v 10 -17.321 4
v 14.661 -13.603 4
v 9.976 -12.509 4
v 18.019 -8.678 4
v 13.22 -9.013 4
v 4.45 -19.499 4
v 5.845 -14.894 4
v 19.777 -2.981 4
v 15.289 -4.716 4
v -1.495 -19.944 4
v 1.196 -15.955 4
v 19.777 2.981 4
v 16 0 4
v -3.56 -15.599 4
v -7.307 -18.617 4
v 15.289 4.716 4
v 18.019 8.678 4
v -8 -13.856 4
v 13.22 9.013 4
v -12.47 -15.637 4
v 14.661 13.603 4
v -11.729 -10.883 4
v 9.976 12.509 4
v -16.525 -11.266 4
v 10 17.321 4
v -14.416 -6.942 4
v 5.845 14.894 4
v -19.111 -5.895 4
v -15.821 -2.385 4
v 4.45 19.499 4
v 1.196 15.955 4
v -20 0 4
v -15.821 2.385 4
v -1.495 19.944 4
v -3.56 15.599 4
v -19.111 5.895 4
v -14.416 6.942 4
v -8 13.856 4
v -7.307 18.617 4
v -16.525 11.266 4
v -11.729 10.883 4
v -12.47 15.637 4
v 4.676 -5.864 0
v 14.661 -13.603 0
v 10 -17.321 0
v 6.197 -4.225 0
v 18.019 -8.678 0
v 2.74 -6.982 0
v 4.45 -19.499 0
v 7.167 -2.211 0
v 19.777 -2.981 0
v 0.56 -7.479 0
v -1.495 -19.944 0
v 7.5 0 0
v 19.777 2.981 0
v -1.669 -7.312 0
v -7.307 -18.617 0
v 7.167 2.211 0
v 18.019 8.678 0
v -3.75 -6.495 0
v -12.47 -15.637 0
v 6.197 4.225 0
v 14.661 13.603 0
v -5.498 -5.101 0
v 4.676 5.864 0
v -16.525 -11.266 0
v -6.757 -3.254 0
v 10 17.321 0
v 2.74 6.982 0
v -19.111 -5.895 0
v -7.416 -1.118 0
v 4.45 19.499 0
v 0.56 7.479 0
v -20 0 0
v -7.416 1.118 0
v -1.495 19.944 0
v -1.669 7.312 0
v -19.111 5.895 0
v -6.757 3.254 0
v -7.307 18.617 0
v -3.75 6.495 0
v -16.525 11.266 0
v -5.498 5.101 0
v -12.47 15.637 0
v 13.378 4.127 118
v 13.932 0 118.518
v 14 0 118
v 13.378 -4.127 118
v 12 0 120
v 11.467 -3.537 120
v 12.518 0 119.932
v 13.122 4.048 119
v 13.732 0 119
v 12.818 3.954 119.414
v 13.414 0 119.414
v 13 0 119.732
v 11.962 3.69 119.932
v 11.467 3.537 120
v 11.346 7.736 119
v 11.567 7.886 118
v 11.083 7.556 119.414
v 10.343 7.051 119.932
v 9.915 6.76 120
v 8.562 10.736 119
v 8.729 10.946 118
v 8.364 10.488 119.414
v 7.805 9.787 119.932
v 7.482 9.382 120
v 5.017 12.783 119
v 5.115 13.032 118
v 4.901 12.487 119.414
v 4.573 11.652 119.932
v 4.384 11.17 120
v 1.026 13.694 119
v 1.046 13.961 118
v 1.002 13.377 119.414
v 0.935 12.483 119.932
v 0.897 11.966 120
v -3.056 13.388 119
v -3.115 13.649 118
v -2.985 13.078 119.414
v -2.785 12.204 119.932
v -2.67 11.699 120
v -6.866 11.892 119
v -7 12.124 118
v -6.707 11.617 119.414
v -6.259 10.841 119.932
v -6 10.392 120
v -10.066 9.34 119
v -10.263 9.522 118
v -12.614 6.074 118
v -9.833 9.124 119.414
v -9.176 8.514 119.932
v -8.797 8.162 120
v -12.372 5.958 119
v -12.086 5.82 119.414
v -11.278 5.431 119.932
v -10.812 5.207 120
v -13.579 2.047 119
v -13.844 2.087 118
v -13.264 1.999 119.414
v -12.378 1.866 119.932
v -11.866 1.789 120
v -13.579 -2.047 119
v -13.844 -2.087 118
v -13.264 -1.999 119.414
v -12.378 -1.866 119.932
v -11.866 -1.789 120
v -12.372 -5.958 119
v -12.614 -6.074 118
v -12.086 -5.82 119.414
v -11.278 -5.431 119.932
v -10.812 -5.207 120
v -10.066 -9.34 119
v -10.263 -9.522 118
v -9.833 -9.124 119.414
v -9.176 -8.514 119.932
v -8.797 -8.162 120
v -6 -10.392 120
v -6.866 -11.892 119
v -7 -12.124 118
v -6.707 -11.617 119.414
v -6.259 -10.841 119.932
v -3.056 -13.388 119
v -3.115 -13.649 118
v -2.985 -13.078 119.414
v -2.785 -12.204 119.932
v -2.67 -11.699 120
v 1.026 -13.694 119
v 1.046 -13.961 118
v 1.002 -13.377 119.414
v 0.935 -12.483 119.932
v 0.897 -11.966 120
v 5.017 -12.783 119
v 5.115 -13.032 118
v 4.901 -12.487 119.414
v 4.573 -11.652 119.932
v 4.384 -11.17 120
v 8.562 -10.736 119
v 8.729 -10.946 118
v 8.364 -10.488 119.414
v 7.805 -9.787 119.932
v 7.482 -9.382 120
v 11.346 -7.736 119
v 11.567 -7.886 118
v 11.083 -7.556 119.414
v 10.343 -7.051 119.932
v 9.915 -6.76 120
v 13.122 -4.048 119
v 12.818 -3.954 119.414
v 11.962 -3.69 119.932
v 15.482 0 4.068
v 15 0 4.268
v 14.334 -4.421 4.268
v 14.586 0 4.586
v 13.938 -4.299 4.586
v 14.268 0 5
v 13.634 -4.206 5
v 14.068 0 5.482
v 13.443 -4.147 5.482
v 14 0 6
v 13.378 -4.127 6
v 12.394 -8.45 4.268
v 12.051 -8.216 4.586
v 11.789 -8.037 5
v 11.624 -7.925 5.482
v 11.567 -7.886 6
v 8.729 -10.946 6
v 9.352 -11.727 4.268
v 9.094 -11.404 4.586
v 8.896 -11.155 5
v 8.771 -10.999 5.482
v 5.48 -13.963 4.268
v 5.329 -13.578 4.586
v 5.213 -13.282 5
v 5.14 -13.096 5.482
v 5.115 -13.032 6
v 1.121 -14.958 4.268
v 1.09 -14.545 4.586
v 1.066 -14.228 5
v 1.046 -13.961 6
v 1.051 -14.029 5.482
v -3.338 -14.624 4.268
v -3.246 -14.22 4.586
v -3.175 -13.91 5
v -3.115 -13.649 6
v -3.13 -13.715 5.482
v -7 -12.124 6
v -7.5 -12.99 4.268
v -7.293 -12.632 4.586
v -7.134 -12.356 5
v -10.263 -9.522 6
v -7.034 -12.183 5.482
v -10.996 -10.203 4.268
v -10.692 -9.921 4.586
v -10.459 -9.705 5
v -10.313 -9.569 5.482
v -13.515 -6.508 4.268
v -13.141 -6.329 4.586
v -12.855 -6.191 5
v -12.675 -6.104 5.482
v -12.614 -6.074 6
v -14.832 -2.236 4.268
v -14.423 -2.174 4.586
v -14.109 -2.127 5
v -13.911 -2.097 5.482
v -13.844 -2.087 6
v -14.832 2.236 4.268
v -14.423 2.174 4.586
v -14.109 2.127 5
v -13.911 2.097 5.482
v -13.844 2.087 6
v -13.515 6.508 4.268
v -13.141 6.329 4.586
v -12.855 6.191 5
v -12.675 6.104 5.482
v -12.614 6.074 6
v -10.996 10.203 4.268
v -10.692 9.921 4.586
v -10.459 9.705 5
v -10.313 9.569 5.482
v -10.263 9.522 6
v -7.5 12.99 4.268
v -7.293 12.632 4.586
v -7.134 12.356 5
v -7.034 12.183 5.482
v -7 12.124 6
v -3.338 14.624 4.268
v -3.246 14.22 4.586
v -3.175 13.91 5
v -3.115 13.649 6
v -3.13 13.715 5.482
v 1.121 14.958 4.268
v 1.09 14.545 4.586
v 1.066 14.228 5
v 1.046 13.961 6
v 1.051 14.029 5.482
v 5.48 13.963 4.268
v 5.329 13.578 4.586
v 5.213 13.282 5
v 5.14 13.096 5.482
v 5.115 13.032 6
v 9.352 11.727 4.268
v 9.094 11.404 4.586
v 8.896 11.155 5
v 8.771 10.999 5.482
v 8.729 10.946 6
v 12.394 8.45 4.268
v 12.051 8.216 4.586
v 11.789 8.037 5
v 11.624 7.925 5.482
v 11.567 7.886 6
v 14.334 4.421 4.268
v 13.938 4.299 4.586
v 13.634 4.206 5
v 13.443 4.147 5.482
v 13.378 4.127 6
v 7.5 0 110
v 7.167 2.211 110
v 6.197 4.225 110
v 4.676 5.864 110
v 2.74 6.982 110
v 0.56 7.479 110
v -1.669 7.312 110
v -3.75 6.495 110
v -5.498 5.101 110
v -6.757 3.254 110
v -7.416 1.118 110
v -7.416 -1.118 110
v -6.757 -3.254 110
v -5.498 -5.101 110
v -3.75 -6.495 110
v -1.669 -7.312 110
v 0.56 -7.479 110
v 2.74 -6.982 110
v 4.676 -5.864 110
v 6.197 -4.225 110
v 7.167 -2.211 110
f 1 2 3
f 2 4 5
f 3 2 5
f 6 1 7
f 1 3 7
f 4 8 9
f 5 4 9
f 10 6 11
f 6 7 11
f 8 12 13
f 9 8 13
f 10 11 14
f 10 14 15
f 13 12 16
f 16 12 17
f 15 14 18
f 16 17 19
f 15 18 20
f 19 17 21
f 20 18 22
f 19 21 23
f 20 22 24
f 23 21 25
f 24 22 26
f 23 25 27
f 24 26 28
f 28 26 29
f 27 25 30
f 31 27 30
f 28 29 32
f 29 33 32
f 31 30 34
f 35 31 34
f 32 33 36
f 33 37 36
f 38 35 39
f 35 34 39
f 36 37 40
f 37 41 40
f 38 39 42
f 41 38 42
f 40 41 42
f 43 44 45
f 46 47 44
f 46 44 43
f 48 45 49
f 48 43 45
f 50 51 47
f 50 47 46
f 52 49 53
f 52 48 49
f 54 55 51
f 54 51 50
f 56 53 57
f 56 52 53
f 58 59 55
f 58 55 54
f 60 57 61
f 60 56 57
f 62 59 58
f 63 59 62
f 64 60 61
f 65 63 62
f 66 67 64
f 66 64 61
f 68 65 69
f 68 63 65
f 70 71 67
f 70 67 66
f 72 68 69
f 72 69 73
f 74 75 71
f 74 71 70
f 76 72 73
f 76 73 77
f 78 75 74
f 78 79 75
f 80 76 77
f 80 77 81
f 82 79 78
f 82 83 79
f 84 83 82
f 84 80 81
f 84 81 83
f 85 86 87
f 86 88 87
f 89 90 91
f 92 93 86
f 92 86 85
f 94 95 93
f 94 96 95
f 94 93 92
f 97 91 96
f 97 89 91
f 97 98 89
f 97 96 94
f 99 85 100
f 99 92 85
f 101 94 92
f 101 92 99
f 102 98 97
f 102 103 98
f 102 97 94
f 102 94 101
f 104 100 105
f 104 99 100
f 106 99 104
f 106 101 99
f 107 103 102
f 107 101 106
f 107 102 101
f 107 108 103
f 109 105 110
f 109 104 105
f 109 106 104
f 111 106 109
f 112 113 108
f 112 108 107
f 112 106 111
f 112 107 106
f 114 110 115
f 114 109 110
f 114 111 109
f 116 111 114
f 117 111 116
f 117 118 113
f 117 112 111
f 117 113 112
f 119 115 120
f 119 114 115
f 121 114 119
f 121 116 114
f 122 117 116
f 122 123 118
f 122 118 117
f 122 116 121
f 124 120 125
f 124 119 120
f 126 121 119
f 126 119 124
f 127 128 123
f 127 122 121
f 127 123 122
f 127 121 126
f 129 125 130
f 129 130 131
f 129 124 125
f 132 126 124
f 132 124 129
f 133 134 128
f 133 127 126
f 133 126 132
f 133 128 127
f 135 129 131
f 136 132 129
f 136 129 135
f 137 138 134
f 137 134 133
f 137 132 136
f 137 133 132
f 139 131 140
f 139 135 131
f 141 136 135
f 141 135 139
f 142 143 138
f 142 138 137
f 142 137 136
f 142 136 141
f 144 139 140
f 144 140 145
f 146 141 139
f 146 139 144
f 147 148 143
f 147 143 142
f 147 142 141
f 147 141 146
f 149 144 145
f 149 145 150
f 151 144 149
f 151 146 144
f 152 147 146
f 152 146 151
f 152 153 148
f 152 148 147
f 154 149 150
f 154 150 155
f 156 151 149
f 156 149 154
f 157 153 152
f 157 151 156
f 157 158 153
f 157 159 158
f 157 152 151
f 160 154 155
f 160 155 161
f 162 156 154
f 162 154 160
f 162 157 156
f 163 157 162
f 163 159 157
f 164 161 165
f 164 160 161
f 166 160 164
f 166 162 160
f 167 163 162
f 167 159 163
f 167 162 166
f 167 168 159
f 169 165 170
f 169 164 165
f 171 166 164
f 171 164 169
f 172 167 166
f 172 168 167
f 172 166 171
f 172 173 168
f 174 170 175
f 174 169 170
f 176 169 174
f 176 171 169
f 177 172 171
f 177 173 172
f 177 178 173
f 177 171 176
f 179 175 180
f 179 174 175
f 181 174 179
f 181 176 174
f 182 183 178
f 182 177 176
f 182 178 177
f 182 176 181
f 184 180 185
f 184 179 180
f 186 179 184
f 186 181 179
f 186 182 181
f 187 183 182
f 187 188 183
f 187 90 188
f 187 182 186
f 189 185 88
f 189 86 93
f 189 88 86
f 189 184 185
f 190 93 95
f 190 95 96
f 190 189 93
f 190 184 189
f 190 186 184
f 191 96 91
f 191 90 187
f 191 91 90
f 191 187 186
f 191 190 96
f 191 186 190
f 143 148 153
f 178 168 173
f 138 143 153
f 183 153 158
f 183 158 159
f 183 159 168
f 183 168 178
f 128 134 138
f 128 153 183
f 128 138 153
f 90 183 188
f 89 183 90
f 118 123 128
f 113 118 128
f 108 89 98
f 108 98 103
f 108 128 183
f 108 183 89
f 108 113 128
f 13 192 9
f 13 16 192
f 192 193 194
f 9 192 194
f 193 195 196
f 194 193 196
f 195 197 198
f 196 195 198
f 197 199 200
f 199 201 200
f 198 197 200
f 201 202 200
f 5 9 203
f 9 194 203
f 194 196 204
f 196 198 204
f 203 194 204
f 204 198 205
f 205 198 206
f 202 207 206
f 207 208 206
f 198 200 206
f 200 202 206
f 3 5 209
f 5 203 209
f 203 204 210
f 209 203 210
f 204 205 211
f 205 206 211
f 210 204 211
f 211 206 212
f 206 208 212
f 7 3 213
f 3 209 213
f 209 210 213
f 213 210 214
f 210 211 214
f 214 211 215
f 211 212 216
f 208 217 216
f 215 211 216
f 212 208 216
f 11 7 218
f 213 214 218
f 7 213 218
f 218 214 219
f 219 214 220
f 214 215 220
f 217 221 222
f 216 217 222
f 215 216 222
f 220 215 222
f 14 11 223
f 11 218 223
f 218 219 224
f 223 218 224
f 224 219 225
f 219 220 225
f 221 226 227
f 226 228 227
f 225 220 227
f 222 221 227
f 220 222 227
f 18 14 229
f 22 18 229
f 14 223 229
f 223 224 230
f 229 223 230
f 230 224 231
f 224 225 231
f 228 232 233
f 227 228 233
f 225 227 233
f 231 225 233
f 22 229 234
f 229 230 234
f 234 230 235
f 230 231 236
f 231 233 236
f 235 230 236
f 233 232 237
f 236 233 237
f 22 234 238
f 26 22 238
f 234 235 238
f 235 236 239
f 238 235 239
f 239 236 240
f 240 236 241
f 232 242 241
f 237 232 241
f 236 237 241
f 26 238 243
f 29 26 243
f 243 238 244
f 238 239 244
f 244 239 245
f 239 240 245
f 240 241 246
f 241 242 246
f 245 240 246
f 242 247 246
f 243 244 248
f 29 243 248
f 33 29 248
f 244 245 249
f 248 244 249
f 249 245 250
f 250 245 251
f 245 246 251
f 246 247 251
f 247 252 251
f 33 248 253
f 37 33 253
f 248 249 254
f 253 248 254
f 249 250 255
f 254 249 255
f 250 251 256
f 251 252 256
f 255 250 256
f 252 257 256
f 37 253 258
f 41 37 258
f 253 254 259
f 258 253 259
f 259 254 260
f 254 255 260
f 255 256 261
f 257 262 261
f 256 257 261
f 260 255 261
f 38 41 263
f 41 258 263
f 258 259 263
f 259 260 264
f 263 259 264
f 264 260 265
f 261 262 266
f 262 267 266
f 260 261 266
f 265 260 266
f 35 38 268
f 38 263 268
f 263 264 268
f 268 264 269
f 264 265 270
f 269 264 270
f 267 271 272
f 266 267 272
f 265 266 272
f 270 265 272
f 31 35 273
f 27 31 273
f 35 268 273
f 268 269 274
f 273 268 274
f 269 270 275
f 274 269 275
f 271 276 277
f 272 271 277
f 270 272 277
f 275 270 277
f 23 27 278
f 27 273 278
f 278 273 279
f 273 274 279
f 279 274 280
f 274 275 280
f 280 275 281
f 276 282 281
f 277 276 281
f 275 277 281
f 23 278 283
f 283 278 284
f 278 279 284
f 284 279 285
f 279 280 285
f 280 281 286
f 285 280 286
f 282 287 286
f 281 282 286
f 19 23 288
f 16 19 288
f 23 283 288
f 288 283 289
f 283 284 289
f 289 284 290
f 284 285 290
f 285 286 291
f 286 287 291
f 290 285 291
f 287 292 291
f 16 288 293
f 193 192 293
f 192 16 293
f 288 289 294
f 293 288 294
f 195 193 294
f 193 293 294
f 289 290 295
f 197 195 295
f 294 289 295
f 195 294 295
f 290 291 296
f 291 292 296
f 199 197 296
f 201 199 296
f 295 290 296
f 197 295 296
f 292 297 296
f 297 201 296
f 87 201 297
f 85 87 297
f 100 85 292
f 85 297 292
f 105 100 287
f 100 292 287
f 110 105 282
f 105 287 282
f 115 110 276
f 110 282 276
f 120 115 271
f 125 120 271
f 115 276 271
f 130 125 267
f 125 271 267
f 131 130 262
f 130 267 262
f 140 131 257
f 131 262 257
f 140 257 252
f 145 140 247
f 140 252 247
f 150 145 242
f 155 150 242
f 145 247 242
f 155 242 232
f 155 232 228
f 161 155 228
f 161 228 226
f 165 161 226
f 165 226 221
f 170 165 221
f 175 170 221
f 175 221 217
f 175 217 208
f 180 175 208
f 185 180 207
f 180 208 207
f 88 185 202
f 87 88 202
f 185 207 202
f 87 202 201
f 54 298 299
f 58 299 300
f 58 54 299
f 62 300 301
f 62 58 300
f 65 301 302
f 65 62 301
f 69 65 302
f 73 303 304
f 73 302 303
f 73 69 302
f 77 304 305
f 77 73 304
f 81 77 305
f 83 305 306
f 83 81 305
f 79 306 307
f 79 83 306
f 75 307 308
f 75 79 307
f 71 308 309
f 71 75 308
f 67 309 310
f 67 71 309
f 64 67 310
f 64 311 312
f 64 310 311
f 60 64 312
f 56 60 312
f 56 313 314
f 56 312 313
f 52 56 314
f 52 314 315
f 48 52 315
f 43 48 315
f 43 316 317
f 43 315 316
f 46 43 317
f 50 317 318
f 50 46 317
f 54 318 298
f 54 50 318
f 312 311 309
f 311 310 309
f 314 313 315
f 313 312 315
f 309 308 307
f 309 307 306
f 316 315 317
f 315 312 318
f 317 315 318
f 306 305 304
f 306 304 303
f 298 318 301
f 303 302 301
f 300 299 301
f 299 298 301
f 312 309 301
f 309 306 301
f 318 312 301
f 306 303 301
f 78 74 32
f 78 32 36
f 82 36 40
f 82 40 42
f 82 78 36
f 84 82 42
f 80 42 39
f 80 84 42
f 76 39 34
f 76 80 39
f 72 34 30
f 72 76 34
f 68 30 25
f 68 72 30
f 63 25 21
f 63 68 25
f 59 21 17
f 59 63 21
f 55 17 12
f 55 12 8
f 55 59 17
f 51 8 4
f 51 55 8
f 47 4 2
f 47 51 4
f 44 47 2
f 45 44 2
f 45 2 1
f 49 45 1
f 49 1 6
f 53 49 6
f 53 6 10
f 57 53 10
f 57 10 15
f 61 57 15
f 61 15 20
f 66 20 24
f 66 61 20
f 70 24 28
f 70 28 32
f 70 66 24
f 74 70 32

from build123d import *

# Parameters (mm, degrees)
SKETCH1_R           = 14
SKETCH1_R_2         = 7.5
BOSS_EXTRUDE1_DEPTH = 120
BOSS_EXTRUDE2_START = -10
SKETCH2_R           = 14
BOSS_EXTRUDE2_DEPTH = 10
SKETCH3_R           = 20
SKETCH3_R_2         = 7.5
BOSS_EXTRUDE3_DEPTH = 4
FILLET3_R           = 2


with BuildPart() as part:
    # Sketch1 → Boss-Extrude1 (new body)
    with BuildSketch(Plane.XY):
        Circle(SKETCH1_R)
        Circle(SKETCH1_R_2, mode=Mode.SUBTRACT)
    extrude(amount=BOSS_EXTRUDE1_DEPTH)

    # Sketch2 → Boss-Extrude2 (add)
    with BuildSketch(Plane.XY.offset(120).offset(BOSS_EXTRUDE2_START)):
        Circle(SKETCH2_R)
    extrude(amount=BOSS_EXTRUDE2_DEPTH)

    # Sketch3 → Boss-Extrude3 (add)
    with BuildSketch(Plane(origin=(0, 0, 0), x_dir=(-1, 0, 0), z_dir=(0, 0, -1))):
        Circle(SKETCH3_R)
        with Locations(Location((0, 0, 0), (0, 0, 180))):
            Circle(SKETCH3_R_2, mode=Mode.SUBTRACT)
    extrude(amount=-BOSS_EXTRUDE3_DEPTH)

    # Fillet3
    fillet3_edges = [part.edges().sort_by_distance(p)[0] for p in [
        (-14, 0, 4),
        (-14, 0, 120),
    ]]
    fillet(fillet3_edges, radius=FILLET3_R)


solid = part.part
